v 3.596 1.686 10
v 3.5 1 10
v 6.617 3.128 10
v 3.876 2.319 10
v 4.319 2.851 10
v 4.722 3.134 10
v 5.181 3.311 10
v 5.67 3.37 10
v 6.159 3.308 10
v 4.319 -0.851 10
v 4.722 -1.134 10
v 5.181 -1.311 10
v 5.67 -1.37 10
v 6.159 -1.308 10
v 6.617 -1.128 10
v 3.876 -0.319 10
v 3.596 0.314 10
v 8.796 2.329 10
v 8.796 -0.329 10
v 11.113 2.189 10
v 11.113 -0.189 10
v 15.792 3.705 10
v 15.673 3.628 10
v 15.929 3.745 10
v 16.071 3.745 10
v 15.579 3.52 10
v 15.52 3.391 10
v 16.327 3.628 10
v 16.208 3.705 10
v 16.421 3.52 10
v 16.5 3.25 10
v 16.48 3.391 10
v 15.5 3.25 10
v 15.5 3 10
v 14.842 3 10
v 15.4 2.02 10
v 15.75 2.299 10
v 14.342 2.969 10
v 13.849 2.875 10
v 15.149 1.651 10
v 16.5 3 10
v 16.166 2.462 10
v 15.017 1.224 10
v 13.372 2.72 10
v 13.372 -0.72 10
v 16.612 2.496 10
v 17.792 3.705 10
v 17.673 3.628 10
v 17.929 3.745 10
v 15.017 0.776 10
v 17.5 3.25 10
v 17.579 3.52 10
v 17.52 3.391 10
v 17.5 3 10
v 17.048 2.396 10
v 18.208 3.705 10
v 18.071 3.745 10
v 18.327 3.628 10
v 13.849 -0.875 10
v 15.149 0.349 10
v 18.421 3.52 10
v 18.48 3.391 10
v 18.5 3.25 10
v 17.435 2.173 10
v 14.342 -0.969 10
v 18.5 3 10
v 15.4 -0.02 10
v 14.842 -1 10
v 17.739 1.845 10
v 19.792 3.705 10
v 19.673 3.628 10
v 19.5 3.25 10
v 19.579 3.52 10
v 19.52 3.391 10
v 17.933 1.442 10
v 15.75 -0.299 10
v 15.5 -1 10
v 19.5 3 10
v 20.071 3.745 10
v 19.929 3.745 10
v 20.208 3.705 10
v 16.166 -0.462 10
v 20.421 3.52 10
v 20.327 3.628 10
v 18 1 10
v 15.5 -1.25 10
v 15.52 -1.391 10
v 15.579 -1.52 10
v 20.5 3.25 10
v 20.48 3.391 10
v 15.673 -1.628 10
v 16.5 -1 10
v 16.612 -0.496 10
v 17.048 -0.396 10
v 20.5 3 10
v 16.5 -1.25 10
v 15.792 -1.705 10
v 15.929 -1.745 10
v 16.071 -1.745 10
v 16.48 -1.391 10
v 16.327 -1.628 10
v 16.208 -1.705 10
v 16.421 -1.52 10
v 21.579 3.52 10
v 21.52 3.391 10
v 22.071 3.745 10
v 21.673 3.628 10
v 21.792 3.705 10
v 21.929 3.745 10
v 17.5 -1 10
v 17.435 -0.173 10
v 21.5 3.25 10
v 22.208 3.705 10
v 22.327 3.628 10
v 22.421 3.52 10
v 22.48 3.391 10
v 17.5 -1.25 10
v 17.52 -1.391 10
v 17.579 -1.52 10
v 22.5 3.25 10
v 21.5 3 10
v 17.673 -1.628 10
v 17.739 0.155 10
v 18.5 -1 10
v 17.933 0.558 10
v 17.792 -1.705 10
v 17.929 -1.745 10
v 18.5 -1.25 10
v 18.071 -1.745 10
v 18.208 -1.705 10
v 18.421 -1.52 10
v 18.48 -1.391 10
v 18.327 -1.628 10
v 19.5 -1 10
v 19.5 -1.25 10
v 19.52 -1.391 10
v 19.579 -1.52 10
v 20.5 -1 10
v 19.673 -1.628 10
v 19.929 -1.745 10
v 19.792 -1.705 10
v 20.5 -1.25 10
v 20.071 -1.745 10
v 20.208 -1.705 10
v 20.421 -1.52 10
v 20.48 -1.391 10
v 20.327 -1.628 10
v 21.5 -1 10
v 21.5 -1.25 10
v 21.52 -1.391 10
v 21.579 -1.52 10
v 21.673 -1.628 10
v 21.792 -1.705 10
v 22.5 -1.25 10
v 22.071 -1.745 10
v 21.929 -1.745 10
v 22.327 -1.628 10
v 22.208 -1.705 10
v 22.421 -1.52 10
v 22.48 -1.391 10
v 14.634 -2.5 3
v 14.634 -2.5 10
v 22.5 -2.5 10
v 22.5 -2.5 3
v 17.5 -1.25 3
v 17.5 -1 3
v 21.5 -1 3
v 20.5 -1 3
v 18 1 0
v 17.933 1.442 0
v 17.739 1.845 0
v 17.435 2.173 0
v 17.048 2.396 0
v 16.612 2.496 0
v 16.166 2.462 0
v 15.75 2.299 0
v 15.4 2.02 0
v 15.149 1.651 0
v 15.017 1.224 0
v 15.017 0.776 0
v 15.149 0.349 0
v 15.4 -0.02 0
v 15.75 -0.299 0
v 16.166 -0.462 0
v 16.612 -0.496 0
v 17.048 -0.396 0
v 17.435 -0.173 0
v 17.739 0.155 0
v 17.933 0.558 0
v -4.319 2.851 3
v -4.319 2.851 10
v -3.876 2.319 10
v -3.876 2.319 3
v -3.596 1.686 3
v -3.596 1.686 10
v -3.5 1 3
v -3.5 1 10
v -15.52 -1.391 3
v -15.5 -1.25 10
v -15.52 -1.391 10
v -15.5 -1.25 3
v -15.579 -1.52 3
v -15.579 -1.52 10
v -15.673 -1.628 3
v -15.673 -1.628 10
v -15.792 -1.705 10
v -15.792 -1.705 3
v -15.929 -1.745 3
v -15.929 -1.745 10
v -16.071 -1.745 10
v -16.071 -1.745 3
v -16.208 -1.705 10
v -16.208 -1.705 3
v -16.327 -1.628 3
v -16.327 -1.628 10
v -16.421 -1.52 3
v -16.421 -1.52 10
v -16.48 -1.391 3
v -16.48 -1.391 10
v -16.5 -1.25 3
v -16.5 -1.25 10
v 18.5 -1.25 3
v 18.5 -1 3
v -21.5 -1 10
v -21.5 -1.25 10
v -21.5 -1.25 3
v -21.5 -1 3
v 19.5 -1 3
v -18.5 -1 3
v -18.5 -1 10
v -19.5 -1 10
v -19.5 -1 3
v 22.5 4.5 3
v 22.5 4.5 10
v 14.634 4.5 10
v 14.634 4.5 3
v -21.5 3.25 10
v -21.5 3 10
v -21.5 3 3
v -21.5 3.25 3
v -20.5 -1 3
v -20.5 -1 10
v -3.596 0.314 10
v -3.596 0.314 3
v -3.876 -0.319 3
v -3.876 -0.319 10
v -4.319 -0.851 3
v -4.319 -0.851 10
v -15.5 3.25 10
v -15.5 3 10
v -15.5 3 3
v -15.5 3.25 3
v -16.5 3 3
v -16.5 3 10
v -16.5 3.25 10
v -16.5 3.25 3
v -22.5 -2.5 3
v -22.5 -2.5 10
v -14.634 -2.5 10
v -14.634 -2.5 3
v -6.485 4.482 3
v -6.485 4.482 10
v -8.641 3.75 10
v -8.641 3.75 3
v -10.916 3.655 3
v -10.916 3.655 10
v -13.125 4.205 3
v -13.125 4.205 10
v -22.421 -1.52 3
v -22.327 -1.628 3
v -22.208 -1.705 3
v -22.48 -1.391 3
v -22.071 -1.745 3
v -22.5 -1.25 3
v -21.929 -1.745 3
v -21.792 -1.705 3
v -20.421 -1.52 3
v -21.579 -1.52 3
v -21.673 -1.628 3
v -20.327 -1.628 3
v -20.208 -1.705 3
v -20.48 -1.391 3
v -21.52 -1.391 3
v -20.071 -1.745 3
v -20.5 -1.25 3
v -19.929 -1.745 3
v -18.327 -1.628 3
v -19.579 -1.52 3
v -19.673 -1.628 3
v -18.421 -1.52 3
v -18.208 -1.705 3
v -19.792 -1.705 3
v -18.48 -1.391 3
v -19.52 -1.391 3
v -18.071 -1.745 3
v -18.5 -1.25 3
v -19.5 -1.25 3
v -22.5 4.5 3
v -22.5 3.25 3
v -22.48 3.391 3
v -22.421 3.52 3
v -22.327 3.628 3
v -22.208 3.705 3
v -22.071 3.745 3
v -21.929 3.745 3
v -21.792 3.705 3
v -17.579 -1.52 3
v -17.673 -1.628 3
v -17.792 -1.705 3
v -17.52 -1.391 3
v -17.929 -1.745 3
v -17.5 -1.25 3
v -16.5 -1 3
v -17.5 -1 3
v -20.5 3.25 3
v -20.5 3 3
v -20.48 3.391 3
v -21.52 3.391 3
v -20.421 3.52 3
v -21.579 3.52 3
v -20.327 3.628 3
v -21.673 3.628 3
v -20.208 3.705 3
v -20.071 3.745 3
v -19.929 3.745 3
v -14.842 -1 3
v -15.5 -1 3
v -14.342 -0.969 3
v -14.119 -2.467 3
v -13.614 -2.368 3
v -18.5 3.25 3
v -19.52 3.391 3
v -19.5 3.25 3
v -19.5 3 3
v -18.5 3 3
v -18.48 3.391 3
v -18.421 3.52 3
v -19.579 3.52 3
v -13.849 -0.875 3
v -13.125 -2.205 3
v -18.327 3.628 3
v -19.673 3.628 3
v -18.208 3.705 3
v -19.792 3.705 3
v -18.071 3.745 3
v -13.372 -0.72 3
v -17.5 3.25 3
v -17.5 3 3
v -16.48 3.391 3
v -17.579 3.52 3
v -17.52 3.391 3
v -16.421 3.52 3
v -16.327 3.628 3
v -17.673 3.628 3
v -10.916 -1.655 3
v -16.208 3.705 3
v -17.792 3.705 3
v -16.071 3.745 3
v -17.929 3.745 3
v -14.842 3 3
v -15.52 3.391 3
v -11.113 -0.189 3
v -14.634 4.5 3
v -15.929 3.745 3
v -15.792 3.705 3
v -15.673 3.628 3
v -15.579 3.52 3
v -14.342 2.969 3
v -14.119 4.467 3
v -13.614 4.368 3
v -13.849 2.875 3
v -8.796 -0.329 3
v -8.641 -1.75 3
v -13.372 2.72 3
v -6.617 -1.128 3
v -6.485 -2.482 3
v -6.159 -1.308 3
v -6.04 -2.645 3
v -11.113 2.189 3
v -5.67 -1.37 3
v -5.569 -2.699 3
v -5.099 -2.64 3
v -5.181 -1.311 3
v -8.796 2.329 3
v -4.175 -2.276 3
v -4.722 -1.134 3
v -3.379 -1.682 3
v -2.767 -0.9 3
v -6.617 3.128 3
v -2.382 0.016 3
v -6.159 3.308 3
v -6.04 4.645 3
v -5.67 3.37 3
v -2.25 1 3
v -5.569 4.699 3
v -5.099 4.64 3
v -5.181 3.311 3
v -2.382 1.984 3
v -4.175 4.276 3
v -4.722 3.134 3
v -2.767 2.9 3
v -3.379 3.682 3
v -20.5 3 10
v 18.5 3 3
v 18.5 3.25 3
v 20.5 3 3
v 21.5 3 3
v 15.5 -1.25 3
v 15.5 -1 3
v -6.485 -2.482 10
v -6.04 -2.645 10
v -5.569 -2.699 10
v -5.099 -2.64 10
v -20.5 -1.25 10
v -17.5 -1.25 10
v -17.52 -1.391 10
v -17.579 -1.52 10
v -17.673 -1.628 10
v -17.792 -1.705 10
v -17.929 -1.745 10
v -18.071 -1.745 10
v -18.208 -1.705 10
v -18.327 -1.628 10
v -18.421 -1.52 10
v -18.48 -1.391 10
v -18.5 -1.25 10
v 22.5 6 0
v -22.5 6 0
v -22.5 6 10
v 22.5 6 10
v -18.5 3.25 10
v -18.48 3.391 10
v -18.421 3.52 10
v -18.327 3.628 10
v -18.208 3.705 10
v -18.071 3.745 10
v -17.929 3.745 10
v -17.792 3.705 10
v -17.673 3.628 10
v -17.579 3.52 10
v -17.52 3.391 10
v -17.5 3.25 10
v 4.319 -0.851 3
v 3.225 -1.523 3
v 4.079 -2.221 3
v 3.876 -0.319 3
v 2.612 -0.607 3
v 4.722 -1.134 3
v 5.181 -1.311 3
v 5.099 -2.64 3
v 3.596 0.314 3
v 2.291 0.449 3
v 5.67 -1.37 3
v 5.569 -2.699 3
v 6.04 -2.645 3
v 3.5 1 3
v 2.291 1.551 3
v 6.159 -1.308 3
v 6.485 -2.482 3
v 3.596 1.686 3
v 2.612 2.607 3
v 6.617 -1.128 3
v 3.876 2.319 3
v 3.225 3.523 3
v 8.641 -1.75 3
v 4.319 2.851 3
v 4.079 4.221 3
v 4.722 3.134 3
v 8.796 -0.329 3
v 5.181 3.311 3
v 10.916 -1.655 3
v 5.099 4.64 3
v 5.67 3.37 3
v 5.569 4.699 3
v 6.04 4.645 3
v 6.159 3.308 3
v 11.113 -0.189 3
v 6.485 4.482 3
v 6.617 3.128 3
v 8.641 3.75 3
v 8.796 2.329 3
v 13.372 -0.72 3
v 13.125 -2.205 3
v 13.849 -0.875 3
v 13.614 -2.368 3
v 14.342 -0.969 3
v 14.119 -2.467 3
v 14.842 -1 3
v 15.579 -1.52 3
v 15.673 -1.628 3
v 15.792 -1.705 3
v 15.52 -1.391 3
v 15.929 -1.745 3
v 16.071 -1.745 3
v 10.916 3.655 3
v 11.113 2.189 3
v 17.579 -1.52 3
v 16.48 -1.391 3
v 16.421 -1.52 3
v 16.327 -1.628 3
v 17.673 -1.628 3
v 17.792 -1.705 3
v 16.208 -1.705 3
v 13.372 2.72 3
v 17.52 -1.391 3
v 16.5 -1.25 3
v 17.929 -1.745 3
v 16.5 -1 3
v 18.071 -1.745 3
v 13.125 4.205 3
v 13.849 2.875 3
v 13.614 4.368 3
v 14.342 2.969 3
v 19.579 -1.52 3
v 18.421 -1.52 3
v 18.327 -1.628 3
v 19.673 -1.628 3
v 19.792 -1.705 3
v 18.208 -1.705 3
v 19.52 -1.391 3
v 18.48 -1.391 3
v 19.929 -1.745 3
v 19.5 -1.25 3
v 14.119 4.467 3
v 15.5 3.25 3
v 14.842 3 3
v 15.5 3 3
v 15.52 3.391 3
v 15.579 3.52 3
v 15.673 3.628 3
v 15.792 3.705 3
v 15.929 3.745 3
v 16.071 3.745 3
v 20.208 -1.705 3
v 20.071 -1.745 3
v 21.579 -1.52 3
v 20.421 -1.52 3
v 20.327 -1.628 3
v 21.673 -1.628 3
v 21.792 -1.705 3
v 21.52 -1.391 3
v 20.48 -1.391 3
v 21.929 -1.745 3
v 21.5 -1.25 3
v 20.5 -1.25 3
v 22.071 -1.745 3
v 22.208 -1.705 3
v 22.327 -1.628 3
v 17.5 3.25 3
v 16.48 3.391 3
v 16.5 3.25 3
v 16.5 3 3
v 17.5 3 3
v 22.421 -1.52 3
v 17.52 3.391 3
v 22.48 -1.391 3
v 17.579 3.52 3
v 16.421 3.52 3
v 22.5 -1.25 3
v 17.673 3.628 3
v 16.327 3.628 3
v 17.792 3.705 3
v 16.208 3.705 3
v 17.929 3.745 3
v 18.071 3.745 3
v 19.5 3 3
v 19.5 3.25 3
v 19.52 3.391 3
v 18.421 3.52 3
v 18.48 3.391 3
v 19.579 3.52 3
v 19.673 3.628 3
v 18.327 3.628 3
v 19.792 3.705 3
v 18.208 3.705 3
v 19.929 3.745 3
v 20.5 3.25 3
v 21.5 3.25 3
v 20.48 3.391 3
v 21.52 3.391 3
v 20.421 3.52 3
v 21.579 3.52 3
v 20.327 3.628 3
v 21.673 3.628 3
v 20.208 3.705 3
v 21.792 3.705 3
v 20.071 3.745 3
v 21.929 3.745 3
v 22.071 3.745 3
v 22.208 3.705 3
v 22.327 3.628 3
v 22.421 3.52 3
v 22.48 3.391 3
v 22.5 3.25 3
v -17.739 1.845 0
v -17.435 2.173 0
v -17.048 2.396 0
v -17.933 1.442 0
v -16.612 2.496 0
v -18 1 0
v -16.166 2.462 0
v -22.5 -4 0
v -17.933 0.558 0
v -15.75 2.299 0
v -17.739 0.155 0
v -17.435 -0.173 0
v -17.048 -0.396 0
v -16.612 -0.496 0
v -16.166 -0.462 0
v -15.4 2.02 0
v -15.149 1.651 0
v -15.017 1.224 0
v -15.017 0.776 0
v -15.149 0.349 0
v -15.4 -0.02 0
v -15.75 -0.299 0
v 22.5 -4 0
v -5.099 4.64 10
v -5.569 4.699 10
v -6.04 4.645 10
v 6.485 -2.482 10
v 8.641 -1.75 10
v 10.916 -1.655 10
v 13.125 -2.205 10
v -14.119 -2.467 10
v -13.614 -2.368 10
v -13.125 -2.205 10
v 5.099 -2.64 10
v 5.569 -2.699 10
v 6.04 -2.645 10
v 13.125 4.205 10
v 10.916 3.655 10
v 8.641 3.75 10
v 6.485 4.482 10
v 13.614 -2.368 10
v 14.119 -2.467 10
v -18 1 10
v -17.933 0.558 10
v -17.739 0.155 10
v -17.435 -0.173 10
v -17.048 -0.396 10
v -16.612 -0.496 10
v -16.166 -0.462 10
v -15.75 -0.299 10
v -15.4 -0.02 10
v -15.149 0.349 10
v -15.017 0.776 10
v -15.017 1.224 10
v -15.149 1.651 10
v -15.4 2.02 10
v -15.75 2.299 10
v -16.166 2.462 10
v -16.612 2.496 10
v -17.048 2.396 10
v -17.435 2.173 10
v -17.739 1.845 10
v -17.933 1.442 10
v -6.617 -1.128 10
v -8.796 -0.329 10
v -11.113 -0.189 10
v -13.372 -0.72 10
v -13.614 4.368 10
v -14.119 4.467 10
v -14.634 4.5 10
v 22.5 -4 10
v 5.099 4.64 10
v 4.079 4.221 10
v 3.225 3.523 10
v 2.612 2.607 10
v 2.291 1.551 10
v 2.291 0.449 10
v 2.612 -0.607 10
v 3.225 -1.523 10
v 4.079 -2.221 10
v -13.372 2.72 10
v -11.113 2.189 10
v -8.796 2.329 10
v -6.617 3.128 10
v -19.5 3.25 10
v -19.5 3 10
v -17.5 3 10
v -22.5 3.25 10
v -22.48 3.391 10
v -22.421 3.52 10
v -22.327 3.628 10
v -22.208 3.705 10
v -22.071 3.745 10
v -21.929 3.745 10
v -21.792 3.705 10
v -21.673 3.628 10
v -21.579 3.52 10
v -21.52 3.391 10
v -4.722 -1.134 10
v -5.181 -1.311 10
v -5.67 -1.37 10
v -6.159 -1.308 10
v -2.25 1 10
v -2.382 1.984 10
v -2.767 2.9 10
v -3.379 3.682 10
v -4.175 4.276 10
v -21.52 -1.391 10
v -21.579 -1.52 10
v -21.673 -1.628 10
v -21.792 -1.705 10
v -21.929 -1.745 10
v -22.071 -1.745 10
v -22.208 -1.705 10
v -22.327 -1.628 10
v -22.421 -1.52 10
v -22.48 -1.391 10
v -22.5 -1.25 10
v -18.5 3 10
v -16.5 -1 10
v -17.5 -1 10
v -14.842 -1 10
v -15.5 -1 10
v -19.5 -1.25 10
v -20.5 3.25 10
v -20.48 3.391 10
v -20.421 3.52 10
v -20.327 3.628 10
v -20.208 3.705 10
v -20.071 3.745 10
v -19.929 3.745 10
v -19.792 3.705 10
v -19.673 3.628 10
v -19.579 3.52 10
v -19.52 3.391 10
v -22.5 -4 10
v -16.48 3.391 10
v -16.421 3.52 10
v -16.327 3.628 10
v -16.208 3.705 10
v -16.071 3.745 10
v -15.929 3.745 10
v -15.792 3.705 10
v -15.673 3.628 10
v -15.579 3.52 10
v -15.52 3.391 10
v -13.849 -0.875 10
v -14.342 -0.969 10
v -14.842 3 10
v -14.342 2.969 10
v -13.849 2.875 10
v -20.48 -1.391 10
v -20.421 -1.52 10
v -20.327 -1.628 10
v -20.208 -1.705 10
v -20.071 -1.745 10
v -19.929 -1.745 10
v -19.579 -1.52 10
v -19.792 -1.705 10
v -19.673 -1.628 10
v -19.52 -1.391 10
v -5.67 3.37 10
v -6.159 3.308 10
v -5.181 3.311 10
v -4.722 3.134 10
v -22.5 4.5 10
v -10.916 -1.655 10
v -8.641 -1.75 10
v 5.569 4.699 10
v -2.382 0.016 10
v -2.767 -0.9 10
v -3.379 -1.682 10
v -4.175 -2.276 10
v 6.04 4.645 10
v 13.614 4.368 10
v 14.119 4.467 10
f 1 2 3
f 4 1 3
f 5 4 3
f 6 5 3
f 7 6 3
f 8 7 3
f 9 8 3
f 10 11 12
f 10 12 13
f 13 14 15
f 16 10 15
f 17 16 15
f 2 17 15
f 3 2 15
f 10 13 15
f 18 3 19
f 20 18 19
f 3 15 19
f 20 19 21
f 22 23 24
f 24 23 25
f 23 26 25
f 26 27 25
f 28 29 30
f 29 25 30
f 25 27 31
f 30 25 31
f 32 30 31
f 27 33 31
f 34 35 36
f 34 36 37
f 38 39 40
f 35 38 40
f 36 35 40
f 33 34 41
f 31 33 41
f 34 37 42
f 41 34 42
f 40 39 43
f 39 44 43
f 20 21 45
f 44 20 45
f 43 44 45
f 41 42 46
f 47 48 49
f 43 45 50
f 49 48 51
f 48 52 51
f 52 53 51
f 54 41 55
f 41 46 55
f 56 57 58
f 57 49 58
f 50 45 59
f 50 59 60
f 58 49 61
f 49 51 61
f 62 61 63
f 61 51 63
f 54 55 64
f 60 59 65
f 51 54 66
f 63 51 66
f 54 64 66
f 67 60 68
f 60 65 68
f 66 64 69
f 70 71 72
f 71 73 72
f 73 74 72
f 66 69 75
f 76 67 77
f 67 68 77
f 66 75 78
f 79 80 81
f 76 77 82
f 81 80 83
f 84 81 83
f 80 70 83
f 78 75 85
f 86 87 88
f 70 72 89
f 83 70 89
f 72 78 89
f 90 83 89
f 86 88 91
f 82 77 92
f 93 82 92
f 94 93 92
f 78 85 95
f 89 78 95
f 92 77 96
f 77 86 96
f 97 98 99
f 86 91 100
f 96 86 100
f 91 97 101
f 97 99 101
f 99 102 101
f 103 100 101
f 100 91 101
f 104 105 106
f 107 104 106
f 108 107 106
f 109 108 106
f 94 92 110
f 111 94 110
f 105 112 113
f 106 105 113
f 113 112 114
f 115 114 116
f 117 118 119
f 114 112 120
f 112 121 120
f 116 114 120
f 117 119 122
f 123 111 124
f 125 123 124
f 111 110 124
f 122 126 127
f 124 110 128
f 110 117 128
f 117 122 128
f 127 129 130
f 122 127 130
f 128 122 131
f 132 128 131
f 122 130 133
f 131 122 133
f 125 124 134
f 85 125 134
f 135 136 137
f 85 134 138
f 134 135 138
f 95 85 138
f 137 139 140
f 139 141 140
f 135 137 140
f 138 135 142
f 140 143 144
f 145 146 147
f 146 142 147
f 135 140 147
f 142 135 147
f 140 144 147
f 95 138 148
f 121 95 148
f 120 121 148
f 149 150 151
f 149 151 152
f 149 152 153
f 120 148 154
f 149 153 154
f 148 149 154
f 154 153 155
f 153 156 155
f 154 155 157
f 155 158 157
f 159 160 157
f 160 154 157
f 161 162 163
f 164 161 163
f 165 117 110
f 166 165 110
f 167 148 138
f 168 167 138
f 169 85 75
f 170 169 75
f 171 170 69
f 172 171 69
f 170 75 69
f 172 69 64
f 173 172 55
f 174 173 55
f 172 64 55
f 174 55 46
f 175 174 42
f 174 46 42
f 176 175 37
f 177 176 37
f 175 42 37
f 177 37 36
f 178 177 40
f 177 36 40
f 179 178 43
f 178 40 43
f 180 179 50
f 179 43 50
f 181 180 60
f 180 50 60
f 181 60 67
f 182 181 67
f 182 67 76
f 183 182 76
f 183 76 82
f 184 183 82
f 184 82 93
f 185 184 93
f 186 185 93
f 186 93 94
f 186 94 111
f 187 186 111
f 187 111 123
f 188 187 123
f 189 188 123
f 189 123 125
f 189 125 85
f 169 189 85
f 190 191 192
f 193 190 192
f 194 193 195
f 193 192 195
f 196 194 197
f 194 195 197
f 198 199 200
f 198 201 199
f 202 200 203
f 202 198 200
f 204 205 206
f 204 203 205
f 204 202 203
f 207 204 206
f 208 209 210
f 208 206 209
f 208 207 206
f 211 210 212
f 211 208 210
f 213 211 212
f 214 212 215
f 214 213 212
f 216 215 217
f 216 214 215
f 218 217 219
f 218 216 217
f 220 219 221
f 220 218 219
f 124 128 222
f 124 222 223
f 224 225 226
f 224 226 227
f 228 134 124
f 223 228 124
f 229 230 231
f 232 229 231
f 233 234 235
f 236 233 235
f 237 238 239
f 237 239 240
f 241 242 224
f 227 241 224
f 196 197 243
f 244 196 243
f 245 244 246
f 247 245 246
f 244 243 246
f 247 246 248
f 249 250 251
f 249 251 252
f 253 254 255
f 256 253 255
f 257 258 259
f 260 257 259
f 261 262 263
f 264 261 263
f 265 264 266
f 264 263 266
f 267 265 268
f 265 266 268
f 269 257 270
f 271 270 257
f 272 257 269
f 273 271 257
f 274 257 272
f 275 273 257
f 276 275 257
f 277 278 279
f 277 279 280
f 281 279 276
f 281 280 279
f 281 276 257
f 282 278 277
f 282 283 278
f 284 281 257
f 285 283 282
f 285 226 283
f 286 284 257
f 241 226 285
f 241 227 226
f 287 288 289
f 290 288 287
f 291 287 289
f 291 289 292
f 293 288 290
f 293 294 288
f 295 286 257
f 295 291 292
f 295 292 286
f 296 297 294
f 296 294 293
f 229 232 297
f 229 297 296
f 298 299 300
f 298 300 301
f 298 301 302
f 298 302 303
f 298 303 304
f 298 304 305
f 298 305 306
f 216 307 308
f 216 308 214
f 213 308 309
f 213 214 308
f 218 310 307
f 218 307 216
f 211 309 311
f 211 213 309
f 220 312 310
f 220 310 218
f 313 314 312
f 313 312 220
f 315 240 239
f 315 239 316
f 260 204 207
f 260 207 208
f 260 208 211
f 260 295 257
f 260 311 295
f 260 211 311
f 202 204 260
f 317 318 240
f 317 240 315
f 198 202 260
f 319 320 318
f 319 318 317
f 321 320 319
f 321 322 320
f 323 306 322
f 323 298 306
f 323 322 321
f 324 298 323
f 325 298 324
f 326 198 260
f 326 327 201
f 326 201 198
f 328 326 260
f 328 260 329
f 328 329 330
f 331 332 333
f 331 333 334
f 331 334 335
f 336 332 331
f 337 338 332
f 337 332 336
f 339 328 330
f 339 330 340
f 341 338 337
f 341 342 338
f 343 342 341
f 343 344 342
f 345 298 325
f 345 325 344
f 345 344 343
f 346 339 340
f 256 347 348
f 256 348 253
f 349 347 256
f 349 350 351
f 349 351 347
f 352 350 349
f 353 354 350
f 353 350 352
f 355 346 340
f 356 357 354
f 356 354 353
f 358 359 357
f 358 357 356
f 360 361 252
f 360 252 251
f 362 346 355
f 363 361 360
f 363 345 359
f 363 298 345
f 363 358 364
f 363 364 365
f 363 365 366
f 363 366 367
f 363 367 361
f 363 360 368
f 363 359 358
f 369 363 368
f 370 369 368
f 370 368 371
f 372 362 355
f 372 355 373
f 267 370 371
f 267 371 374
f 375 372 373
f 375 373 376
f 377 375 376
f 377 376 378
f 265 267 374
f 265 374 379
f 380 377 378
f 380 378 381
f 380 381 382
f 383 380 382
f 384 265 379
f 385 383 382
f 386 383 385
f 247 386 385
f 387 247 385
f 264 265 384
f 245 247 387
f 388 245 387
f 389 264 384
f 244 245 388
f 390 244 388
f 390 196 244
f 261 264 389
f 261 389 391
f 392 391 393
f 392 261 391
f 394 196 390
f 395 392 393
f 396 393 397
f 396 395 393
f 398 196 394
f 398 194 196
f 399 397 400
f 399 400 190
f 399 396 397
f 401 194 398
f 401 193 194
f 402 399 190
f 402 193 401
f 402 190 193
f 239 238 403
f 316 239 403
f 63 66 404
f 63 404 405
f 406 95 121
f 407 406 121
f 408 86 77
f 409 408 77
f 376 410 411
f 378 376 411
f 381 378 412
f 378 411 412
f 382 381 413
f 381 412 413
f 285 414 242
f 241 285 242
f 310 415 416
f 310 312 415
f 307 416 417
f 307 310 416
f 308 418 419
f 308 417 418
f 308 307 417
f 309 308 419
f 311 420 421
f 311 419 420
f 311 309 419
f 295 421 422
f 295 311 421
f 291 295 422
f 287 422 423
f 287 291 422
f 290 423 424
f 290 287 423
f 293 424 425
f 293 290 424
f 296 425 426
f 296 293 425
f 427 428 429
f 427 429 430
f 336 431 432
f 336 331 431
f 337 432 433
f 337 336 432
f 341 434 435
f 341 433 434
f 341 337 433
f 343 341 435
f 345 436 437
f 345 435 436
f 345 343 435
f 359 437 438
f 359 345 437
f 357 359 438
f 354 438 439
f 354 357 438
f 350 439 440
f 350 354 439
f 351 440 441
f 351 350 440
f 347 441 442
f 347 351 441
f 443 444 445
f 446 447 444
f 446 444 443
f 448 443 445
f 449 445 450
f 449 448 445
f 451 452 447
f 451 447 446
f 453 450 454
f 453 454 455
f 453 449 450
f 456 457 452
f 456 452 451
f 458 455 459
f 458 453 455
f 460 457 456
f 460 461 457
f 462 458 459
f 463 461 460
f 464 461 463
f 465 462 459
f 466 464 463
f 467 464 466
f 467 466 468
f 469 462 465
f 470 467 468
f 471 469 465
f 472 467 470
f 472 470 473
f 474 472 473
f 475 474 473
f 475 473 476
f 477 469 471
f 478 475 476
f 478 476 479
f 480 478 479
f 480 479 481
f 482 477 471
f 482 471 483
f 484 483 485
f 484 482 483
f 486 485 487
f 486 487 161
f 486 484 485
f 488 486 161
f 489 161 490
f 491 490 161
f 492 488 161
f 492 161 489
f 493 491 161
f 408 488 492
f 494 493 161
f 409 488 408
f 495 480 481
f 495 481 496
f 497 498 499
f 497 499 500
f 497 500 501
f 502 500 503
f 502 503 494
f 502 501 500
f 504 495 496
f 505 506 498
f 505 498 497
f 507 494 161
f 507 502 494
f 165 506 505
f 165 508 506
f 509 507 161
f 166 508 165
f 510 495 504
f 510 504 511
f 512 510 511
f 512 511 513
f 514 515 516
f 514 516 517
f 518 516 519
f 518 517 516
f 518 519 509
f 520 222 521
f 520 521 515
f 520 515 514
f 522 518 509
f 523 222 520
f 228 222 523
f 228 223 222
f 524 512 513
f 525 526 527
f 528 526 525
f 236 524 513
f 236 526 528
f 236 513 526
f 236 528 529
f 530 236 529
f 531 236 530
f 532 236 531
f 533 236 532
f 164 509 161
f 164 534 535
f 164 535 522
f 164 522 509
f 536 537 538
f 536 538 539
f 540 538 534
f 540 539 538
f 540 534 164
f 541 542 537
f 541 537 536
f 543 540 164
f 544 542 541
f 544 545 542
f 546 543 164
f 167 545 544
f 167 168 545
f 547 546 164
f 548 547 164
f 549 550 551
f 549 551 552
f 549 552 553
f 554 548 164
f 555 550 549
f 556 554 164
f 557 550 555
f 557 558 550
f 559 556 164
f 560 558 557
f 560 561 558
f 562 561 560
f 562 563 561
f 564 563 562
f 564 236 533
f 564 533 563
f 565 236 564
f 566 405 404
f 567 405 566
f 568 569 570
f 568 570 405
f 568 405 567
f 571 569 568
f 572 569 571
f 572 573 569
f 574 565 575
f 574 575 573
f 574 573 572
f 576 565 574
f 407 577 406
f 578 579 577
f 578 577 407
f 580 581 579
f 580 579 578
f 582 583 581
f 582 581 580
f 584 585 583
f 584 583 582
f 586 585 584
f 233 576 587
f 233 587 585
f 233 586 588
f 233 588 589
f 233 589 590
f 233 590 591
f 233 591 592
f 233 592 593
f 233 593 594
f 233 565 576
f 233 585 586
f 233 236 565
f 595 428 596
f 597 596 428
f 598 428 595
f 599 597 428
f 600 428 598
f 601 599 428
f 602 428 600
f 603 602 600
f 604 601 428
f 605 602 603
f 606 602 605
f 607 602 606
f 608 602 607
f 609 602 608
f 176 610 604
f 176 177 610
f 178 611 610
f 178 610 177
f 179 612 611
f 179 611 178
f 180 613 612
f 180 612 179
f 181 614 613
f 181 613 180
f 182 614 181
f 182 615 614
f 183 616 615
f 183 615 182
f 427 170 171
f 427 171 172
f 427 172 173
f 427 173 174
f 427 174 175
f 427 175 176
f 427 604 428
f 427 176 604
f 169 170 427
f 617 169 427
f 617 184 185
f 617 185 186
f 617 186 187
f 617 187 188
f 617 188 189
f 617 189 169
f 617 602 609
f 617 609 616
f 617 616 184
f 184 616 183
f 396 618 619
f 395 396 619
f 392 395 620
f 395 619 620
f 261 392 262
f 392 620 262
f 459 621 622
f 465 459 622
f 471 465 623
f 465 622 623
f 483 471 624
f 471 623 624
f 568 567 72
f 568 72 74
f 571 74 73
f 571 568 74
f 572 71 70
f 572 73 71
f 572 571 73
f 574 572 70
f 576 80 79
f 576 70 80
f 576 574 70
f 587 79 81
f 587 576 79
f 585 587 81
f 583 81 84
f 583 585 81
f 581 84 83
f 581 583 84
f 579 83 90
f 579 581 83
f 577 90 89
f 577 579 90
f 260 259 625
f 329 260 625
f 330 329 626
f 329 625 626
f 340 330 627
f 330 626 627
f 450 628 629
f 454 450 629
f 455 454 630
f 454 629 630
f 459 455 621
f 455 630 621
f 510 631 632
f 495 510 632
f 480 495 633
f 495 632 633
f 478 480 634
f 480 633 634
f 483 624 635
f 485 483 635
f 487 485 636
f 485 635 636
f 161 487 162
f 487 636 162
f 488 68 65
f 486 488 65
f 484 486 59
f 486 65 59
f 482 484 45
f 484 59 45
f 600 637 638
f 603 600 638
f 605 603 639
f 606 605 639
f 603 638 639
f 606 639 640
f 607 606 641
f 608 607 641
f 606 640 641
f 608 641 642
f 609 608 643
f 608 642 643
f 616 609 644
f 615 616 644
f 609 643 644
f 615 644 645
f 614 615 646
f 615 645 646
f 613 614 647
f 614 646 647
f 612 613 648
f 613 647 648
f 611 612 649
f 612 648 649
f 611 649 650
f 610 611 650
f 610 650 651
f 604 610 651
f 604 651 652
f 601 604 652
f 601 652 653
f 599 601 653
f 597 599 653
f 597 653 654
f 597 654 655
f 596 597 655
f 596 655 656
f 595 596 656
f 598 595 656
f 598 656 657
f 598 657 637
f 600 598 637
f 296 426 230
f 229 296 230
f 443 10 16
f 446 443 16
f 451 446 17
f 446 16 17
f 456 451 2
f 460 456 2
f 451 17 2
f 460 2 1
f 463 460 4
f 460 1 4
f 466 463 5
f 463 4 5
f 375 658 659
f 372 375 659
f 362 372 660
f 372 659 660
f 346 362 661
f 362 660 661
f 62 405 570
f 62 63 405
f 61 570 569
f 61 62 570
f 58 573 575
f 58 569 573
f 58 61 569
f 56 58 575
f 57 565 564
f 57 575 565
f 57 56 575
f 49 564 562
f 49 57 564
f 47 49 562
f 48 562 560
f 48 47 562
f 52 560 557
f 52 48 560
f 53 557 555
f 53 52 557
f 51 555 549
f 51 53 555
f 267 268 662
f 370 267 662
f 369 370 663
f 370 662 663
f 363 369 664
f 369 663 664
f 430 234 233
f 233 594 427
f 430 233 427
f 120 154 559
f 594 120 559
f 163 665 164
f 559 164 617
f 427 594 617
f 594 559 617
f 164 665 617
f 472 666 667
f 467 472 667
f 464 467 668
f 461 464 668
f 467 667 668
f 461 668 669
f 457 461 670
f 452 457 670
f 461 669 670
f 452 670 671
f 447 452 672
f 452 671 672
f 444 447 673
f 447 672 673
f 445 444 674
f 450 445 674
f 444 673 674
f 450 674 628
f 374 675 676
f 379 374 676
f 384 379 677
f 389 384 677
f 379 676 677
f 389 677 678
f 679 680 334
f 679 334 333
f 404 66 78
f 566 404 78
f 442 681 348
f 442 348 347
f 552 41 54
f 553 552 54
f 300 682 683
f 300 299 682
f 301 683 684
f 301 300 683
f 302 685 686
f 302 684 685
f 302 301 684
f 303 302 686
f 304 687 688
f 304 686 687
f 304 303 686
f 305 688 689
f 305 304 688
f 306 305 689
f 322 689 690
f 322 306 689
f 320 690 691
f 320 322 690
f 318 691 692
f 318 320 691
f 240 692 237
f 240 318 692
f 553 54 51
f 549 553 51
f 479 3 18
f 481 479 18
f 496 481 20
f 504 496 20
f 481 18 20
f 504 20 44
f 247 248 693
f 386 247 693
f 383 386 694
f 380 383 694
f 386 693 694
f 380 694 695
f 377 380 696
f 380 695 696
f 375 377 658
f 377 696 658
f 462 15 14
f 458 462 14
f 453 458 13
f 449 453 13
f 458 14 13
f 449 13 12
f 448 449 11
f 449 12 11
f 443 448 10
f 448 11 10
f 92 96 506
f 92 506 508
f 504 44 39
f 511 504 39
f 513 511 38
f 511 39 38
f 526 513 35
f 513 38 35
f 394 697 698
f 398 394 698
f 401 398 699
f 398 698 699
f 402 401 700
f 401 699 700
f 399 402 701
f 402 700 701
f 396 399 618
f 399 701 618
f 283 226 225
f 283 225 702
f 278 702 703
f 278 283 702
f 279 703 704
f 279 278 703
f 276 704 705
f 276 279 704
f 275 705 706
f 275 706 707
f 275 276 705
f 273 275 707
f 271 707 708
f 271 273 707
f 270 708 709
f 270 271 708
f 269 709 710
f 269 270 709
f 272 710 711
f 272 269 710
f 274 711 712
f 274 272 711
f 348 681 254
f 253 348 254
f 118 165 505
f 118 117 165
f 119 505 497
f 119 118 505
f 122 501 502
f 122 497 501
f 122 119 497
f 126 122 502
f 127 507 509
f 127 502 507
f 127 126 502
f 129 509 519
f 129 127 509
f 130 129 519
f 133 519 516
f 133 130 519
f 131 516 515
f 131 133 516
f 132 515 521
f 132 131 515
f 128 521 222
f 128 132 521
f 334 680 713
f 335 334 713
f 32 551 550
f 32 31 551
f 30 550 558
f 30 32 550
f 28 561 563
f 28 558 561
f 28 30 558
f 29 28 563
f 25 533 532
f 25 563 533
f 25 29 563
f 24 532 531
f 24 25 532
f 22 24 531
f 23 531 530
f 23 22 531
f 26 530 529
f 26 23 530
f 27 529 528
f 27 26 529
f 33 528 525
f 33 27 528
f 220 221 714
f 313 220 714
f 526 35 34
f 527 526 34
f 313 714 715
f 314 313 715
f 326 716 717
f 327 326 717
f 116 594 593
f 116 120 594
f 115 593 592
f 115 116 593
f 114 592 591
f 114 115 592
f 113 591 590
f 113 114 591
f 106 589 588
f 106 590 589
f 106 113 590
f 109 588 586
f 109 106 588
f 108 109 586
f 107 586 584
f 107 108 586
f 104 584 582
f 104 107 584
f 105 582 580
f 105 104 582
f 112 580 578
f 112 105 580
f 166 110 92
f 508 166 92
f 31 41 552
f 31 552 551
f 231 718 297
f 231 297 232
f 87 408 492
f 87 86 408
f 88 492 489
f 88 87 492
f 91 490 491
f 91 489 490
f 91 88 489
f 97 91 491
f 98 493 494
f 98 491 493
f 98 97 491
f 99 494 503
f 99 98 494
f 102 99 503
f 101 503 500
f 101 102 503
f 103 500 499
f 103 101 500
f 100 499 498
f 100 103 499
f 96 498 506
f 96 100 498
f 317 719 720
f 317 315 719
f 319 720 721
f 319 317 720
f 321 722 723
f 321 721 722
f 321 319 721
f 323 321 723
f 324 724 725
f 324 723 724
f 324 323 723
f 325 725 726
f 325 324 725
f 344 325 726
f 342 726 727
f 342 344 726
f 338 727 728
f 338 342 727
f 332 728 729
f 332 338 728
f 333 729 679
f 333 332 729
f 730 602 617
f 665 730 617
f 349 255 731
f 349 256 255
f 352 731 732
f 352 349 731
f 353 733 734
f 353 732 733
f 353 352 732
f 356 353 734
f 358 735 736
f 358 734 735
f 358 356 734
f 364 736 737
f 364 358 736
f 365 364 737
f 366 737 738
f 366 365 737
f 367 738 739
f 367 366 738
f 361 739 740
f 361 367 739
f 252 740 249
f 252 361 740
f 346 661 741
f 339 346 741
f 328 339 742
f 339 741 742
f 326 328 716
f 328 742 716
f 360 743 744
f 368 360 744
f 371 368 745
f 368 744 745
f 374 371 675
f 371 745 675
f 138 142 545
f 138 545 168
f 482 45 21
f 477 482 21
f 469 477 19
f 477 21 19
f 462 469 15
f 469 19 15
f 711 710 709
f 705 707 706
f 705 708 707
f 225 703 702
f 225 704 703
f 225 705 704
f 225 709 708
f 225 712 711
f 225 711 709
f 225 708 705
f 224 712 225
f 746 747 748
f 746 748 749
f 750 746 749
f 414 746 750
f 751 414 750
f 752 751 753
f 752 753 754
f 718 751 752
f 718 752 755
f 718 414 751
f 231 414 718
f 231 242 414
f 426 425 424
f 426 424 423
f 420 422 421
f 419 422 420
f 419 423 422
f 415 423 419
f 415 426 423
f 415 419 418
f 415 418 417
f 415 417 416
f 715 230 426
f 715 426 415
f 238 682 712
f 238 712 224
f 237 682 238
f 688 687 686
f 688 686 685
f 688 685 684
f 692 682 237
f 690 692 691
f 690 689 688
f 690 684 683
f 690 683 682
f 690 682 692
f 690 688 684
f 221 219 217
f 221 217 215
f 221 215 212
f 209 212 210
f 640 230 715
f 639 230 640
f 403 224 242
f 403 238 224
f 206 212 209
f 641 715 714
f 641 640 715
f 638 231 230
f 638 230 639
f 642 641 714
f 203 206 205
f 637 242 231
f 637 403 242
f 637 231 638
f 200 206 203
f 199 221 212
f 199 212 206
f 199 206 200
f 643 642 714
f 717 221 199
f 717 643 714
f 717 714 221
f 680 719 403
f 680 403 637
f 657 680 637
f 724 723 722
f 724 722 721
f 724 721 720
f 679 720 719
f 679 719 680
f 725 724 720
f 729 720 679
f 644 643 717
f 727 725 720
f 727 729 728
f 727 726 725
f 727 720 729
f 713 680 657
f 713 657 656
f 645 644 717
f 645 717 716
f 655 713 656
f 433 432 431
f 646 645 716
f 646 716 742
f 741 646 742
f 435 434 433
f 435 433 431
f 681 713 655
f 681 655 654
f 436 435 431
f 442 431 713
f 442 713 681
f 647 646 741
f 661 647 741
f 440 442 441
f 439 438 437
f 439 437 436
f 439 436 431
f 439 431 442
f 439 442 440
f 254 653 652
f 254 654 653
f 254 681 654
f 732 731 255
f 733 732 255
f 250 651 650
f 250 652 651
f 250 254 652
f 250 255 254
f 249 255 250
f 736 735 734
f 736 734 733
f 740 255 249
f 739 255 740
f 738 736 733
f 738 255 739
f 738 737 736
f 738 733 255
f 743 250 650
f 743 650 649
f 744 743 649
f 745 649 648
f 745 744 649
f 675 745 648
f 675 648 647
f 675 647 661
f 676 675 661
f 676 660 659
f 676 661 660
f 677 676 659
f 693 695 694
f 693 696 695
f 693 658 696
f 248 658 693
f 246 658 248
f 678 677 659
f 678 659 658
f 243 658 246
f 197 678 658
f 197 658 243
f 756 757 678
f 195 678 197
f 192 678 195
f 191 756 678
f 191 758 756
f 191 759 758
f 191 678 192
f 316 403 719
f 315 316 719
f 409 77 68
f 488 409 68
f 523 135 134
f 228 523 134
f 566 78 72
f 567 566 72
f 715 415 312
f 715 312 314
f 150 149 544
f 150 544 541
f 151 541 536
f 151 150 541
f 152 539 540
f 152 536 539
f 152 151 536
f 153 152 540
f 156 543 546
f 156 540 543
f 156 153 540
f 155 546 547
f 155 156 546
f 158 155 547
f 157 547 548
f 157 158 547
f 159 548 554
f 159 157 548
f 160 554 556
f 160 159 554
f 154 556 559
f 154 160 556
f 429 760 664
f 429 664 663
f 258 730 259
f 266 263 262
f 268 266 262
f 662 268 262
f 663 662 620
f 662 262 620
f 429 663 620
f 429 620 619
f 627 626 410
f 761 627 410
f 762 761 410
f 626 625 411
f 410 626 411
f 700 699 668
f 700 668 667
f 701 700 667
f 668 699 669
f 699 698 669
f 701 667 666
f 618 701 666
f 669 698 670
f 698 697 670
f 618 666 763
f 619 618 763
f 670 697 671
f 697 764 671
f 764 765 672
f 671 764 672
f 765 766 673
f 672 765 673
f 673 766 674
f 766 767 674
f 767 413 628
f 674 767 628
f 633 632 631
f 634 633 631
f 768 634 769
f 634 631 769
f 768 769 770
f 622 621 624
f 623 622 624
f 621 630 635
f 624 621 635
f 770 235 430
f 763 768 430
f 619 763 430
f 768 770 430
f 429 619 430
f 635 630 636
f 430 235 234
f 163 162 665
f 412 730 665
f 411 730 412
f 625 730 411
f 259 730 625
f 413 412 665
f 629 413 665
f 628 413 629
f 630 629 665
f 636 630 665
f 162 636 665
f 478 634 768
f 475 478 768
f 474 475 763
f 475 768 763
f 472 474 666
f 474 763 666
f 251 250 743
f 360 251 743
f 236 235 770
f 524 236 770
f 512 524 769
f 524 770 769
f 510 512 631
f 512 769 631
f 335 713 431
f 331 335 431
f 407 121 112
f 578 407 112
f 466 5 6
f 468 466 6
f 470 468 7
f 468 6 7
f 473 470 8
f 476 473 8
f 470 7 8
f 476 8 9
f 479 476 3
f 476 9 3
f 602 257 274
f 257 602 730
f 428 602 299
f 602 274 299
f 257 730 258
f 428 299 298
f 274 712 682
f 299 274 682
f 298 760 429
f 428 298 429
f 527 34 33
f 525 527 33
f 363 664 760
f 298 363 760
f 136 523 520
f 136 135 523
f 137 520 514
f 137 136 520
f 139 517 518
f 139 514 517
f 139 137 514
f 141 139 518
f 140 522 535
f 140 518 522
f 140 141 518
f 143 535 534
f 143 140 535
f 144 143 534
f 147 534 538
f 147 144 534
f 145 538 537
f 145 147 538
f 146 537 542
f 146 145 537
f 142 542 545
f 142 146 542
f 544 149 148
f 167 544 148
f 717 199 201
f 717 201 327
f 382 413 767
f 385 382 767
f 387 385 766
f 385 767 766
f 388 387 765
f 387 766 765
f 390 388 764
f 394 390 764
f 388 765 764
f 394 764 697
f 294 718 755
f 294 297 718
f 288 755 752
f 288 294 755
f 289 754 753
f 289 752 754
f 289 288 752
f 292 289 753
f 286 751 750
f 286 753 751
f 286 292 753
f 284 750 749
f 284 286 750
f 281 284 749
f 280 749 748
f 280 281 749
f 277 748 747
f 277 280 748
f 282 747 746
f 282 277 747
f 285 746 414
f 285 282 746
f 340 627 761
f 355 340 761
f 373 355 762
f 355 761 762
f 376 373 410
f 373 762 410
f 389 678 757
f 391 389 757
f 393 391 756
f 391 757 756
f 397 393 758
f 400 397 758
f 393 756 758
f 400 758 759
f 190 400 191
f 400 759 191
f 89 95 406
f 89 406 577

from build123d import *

# Parameters (mm, degrees)
SKETCH_1_W          = 45
SKETCH_1_H          = 8
EXTRUDE_1_DEPTH     = 10
SKETCH_4_W          = 45
SKETCH_4_H          = 10
EXTRUDE_2_DEPTH     = 2
CUT_EXTRUDE_1_DEPTH = 7
SKETCH_7_W          = 1
SKETCH_7_H          = 0.75
EXTRUDE_3_DEPTH     = 7
FILLET_2_RADIUS     = 0.5
FILLET_2_LENGTH     = 7
FILLET_3_RADIUS     = 0.5
FILLET_3_LENGTH     = 7
FILLET_4_RADIUS     = 0.5
FILLET_4_LENGTH     = 7
FILLET_5_RADIUS     = 0.5
FILLET_5_LENGTH     = 7
FILLET_7_RADIUS     = 0.5
FILLET_7_LENGTH     = 7
FILLET_8_RADIUS     = 0.5
FILLET_8_LENGTH     = 7
FILLET_9_RADIUS     = 0.5
FILLET_9_LENGTH     = 7
FILLET_10_RADIUS    = 0.5
FILLET_10_LENGTH    = 7
FILLET_11_RADIUS    = 0.5
FILLET_11_LENGTH    = 7
FILLET_12_RADIUS    = 0.5
FILLET_12_LENGTH    = 7
FILLET_13_RADIUS    = 0.5
FILLET_13_LENGTH    = 7
FILLET_14_RADIUS    = 0.5
FILLET_14_LENGTH    = 7
FILLET_15_RADIUS    = 0.5
FILLET_15_LENGTH    = 7
FILLET_16_RADIUS    = 0.5
FILLET_16_LENGTH    = 7
FILLET_17_RADIUS    = 0.5
FILLET_17_LENGTH    = 7
FILLET_18_RADIUS    = 0.5
FILLET_18_LENGTH    = 7
SKETCH_8_R          = 1.5
CUT_EXTRUDE_3_DEPTH = 26.342651795


with BuildPart() as part:
    # Эскиз1 → Бобышка-Вытянуть1 (new body)
    with BuildSketch(Plane.XY):
        Rectangle(SKETCH_1_W, SKETCH_1_H)
    extrude(amount=EXTRUDE_1_DEPTH)

    # Эскиз4 → Бобышка-Вытянуть2 (add)
    with BuildSketch(Plane(origin=(0, 4, 0), x_dir=(1, 0, 0), z_dir=(0, 1, 0))):
        with Locations((0, -5)):
            Rectangle(SKETCH_4_W, SKETCH_4_H)
    extrude(amount=EXTRUDE_2_DEPTH)

    # Эскиз6 → Вырез-Вытянуть1 (cut)
    with BuildSketch(Plane.XY.offset(10)):
        with BuildLine():
            Line((-3.5, 1), (-2.25, 1))
            ThreePointArc((-2.25, 1), (-3.046951205, 3.311277313), (-5.099068169, 4.640167831))
            ThreePointArc((-5.099068169, 4.640167831), (-5.806494099, 4.685829095), (-6.485410015, 4.481844837))
            ThreePointArc((-6.485410015, 4.481844837), (-9.775223042, 3.62120142), (-13.125305151, 4.204748078))
            ThreePointArc((-13.125305151, 4.204748078), (-13.865120501, 4.42549311), (-14.63356298, 4.5))
            Line((-14.63356298, 4.5), (-22.5, 4.5))
            Line((-22.5, 4.5), (-22.5, 3.75))
            Line((-22.5, 3.75), (-22.5, 3))
            Line((-22.5, 3), (-17, 3))
            Line((-17, 3), (-14.842076238, 3))
            ThreePointArc((-14.842076238, 3), (-14.093837358, 2.929394174), (-13.372013489, 2.720069289))
            ThreePointArc((-13.372013489, 2.720069289), (-9.949457281, 2.174767327), (-6.617441597, 3.128138563))
            ThreePointArc((-6.617441597, 3.128138563), (-5.42405994, 3.3556968), (-4.31914999, 2.850606183))
            ThreePointArc((-4.31914999, 2.850606183), (-3.713941708, 2.011897963), (-3.5, 1))
        make_face()
        with BuildLine():
            ThreePointArc((-5.099068169, -2.640167831), (-3.046951205, -1.311277313), (-2.25, 1))
            Line((-2.25, 1), (-3.5, 1))
            ThreePointArc((-3.5, 1), (-3.713941708, -0.011897963), (-4.31914999, -0.850606183))
            ThreePointArc((-4.31914999, -0.850606183), (-5.42405994, -1.3556968), (-6.617441597, -1.128138563))
            ThreePointArc((-6.617441597, -1.128138563), (-9.949457281, -0.174767327), (-13.372013489, -0.720069289))
            ThreePointArc((-13.372013489, -0.720069289), (-14.093837358, -0.929394174), (-14.842076238, -1))
            Line((-14.842076238, -1), (-17, -1))
            Line((-17, -1), (-22.5, -1))
            Line((-22.5, -1), (-22.5, -2.5))
            Line((-22.5, -2.5), (-14.63356298, -2.5))
            ThreePointArc((-14.63356298, -2.5), (-13.865120501, -2.42549311), (-13.125305151, -2.204748078))
            ThreePointArc((-13.125305151, -2.204748078), (-9.775223042, -1.62120142), (-6.485410015, -2.481844837))
            ThreePointArc((-6.485410015, -2.481844837), (-5.806494099, -2.685829095), (-5.099068169, -2.640167831))
        make_face()
        with BuildLine():
            Line((14.63356298, -2.5), (22.5, -2.5))
            Line((22.5, -2.5), (22.5, -1))
            Line((22.5, -1), (17, -1))
            Line((17, -1), (14.842076238, -1))
            ThreePointArc((14.842076238, -1), (14.093837358, -0.929394174), (13.372013489, -0.720069289))
            ThreePointArc((13.372013489, -0.720069289), (9.949457281, -0.174767327), (6.617441597, -1.128138563))
            ThreePointArc((6.617441597, -1.128138563), (5.42405994, -1.3556968), (4.31914999, -0.850606183))
            ThreePointArc((4.31914999, -0.850606183), (3.5, 1), (4.31914999, 2.850606183))
            ThreePointArc((4.31914999, 2.850606183), (5.42405994, 3.3556968), (6.617441597, 3.128138563))
            ThreePointArc((6.617441597, 3.128138563), (9.949457281, 2.174767327), (13.372013489, 2.720069289))
            ThreePointArc((13.372013489, 2.720069289), (14.093837358, 2.929394174), (14.842076238, 3))
            Line((14.842076238, 3), (17, 3))
            Line((17, 3), (22.5, 3))
            Line((22.5, 3), (22.5, 3.75))
            Line((22.5, 3.75), (22.5, 4.5))
            Line((22.5, 4.5), (14.63356298, 4.5))
            ThreePointArc((14.63356298, 4.5), (13.865120501, 4.42549311), (13.125305151, 4.204748078))
            ThreePointArc((13.125305151, 4.204748078), (9.775223042, 3.62120142), (6.485410015, 4.481844837))
            ThreePointArc((6.485410015, 4.481844837), (5.806494099, 4.685829095), (5.099068169, 4.640167831))
            ThreePointArc((5.099068169, 4.640167831), (2.25, 1), (5.099068169, -2.640167831))
            ThreePointArc((5.099068169, -2.640167831), (5.806494099, -2.685829095), (6.485410015, -2.481844837))
            ThreePointArc((6.485410015, -2.481844837), (9.775223042, -1.62120142), (13.125305151, -2.204748078))
            ThreePointArc((13.125305151, -2.204748078), (13.865120501, -2.42549311), (14.63356298, -2.5))
        make_face()
    extrude(amount=-CUT_EXTRUDE_1_DEPTH, mode=Mode.SUBTRACT)

    # Эскиз7 → Бобышка-Вытянуть3 (add)
    with BuildSketch(Plane.XY.offset(10)):
        with Locations((-22, 3.375)):
            Rectangle(SKETCH_7_W, SKETCH_7_H)
        with Locations((-20, 3.375)):
            Rectangle(SKETCH_7_W, SKETCH_7_H)
        with Locations((-18, 3.375)):
            Rectangle(SKETCH_7_W, SKETCH_7_H)
        with Locations((-16, 3.375)):
            Rectangle(SKETCH_7_W, SKETCH_7_H)
        with Locations((-22, -1.375)):
            Rectangle(SKETCH_7_W, SKETCH_7_H)
        with Locations((-20, -1.375)):
            Rectangle(SKETCH_7_W, SKETCH_7_H)
        with Locations((-18, -1.375)):
            Rectangle(SKETCH_7_W, SKETCH_7_H)
        with Locations((-16, -1.375)):
            Rectangle(SKETCH_7_W, SKETCH_7_H)
        with Locations((16, 3.375)):
            Rectangle(SKETCH_7_W, SKETCH_7_H)
        with Locations((18, 3.375)):
            Rectangle(SKETCH_7_W, SKETCH_7_H)
        with Locations((22, 3.375)):
            Rectangle(SKETCH_7_W, SKETCH_7_H)
        with Locations((22, -1.375)):
            Rectangle(SKETCH_7_W, SKETCH_7_H)
        with Locations((20, -1.375)):
            Rectangle(SKETCH_7_W, SKETCH_7_H)
        with Locations((18, -1.375)):
            Rectangle(SKETCH_7_W, SKETCH_7_H)
        with Locations((16, -1.375)):
            Rectangle(SKETCH_7_W, SKETCH_7_H)
        with Locations((20, 3.375)):
            Rectangle(SKETCH_7_W, SKETCH_7_H)
    extrude(amount=-EXTRUDE_3_DEPTH)

    # Скругление2: full round fillet: the end face becomes a half cylinder, R = half its width
    fillet_2_face = Plane((-20, 3.75, 6.5), x_dir=(0, 0, -1), z_dir=(0, 1, 0))  # on the end face: x along it, z out of the body
    fillet_2_slab = fillet_2_face.offset(-FILLET_2_RADIUS / 2) * Box(FILLET_2_LENGTH, 2 * FILLET_2_RADIUS, FILLET_2_RADIUS, mode=Mode.PRIVATE)  # the body's end, R deep
    fillet_2_round = Plane((-20, 3.25, 6.5), x_dir=(0, 1, 0), z_dir=(0, 0, -1)) * Cylinder(FILLET_2_RADIUS, FILLET_2_LENGTH, mode=Mode.PRIVATE)  # its axis R under the face
    add(fillet_2_slab - fillet_2_round, mode=Mode.SUBTRACT)

    # Скругление3: full round fillet: the end face becomes a half cylinder, R = half its width
    fillet_3_face = Plane((-18, 3.75, 6.5), x_dir=(0, 0, -1), z_dir=(0, 1, 0))  # on the end face: x along it, z out of the body
    fillet_3_slab = fillet_3_face.offset(-FILLET_3_RADIUS / 2) * Box(FILLET_3_LENGTH, 2 * FILLET_3_RADIUS, FILLET_3_RADIUS, mode=Mode.PRIVATE)  # the body's end, R deep
    fillet_3_round = Plane((-18, 3.25, 6.5), x_dir=(0, 1, 0), z_dir=(0, 0, -1)) * Cylinder(FILLET_3_RADIUS, FILLET_3_LENGTH, mode=Mode.PRIVATE)  # its axis R under the face
    add(fillet_3_slab - fillet_3_round, mode=Mode.SUBTRACT)

    # Скругление4: full round fillet: the end face becomes a half cylinder, R = half its width
    fillet_4_face = Plane((-16, 3.75, 6.5), x_dir=(0, 0, -1), z_dir=(0, 1, 0))  # on the end face: x along it, z out of the body
    fillet_4_slab = fillet_4_face.offset(-FILLET_4_RADIUS / 2) * Box(FILLET_4_LENGTH, 2 * FILLET_4_RADIUS, FILLET_4_RADIUS, mode=Mode.PRIVATE)  # the body's end, R deep
    fillet_4_round = Plane((-16, 3.25, 6.5), x_dir=(0, 1, 0), z_dir=(0, 0, -1)) * Cylinder(FILLET_4_RADIUS, FILLET_4_LENGTH, mode=Mode.PRIVATE)  # its axis R under the face
    add(fillet_4_slab - fillet_4_round, mode=Mode.SUBTRACT)

    # Скругление5: full round fillet: the end face becomes a half cylinder, R = half its width
    fillet_5_face = Plane((-22, 3.75, 6.5), x_dir=(0, 0, -1), z_dir=(0, 1, 0))  # on the end face: x along it, z out of the body
    fillet_5_slab = fillet_5_face.offset(-FILLET_5_RADIUS / 2) * Box(FILLET_5_LENGTH, 2 * FILLET_5_RADIUS, FILLET_5_RADIUS, mode=Mode.PRIVATE)  # the body's end, R deep
    fillet_5_round = Plane((-22, 3.25, 6.5), x_dir=(0, 1, 0), z_dir=(0, 0, -1)) * Cylinder(FILLET_5_RADIUS, FILLET_5_LENGTH, mode=Mode.PRIVATE)  # its axis R under the face
    add(fillet_5_slab - fillet_5_round, mode=Mode.SUBTRACT)

    # Скругление7: full round fillet: the end face becomes a half cylinder, R = half its width
    fillet_7_face = Plane((-22, -1.75, 6.5), x_dir=(0, 0, -1), z_dir=(0, -1, 0))  # on the end face: x along it, z out of the body
    fillet_7_slab = fillet_7_face.offset(-FILLET_7_RADIUS / 2) * Box(FILLET_7_LENGTH, 2 * FILLET_7_RADIUS, FILLET_7_RADIUS, mode=Mode.PRIVATE)  # the body's end, R deep
    fillet_7_round = Plane((-22, -1.25, 6.5), x_dir=(0, -1, 0), z_dir=(0, 0, -1)) * Cylinder(FILLET_7_RADIUS, FILLET_7_LENGTH, mode=Mode.PRIVATE)  # its axis R under the face
    add(fillet_7_slab - fillet_7_round, mode=Mode.SUBTRACT)

    # Скругление8: full round fillet: the end face becomes a half cylinder, R = half its width
    fillet_8_face = Plane((-20, -1.75, 6.5), x_dir=(0, 0, -1), z_dir=(0, -1, 0))  # on the end face: x along it, z out of the body
    fillet_8_slab = fillet_8_face.offset(-FILLET_8_RADIUS / 2) * Box(FILLET_8_LENGTH, 2 * FILLET_8_RADIUS, FILLET_8_RADIUS, mode=Mode.PRIVATE)  # the body's end, R deep
    fillet_8_round = Plane((-20, -1.25, 6.5), x_dir=(0, -1, 0), z_dir=(0, 0, -1)) * Cylinder(FILLET_8_RADIUS, FILLET_8_LENGTH, mode=Mode.PRIVATE)  # its axis R under the face
    add(fillet_8_slab - fillet_8_round, mode=Mode.SUBTRACT)

    # Скругление9: full round fillet: the end face becomes a half cylinder, R = half its width
    fillet_9_face = Plane((-18, -1.75, 6.5), x_dir=(0, 0, -1), z_dir=(0, -1, 0))  # on the end face: x along it, z out of the body
    fillet_9_slab = fillet_9_face.offset(-FILLET_9_RADIUS / 2) * Box(FILLET_9_LENGTH, 2 * FILLET_9_RADIUS, FILLET_9_RADIUS, mode=Mode.PRIVATE)  # the body's end, R deep
    fillet_9_round = Plane((-18, -1.25, 6.5), x_dir=(0, -1, 0), z_dir=(0, 0, -1)) * Cylinder(FILLET_9_RADIUS, FILLET_9_LENGTH, mode=Mode.PRIVATE)  # its axis R under the face
    add(fillet_9_slab - fillet_9_round, mode=Mode.SUBTRACT)

    # Скругление10: full round fillet: the end face becomes a half cylinder, R = half its width
    fillet_10_face = Plane((-16, -1.75, 6.5), x_dir=(0, 0, -1), z_dir=(0, -1, 0))  # on the end face: x along it, z out of the body
    fillet_10_slab = fillet_10_face.offset(-FILLET_10_RADIUS / 2) * Box(FILLET_10_LENGTH, 2 * FILLET_10_RADIUS, FILLET_10_RADIUS, mode=Mode.PRIVATE)  # the body's end, R deep
    fillet_10_round = Plane((-16, -1.25, 6.5), x_dir=(0, -1, 0), z_dir=(0, 0, -1)) * Cylinder(FILLET_10_RADIUS, FILLET_10_LENGTH, mode=Mode.PRIVATE)  # its axis R under the face
    add(fillet_10_slab - fillet_10_round, mode=Mode.SUBTRACT)

    # Скругление11: full round fillet: the end face becomes a half cylinder, R = half its width
    fillet_11_face = Plane((22, -1.75, 6.5), x_dir=(0, 0, 1), z_dir=(0, -1, 0))  # on the end face: x along it, z out of the body
    fillet_11_slab = fillet_11_face.offset(-FILLET_11_RADIUS / 2) * Box(FILLET_11_LENGTH, 2 * FILLET_11_RADIUS, FILLET_11_RADIUS, mode=Mode.PRIVATE)  # the body's end, R deep
    fillet_11_round = Plane((22, -1.25, 6.5), x_dir=(0, -1, 0), z_dir=(0, 0, 1)) * Cylinder(FILLET_11_RADIUS, FILLET_11_LENGTH, mode=Mode.PRIVATE)  # its axis R under the face
    add(fillet_11_slab - fillet_11_round, mode=Mode.SUBTRACT)

    # Скругление12: full round fillet: the end face becomes a half cylinder, R = half its width
    fillet_12_face = Plane((20, -1.75, 6.5), x_dir=(0, 0, 1), z_dir=(0, -1, 0))  # on the end face: x along it, z out of the body
    fillet_12_slab = fillet_12_face.offset(-FILLET_12_RADIUS / 2) * Box(FILLET_12_LENGTH, 2 * FILLET_12_RADIUS, FILLET_12_RADIUS, mode=Mode.PRIVATE)  # the body's end, R deep
    fillet_12_round = Plane((20, -1.25, 6.5), x_dir=(0, -1, 0), z_dir=(0, 0, 1)) * Cylinder(FILLET_12_RADIUS, FILLET_12_LENGTH, mode=Mode.PRIVATE)  # its axis R under the face
    add(fillet_12_slab - fillet_12_round, mode=Mode.SUBTRACT)

    # Скругление13: full round fillet: the end face becomes a half cylinder, R = half its width
    fillet_13_face = Plane((18, -1.75, 6.5), x_dir=(0, 0, 1), z_dir=(0, -1, 0))  # on the end face: x along it, z out of the body
    fillet_13_slab = fillet_13_face.offset(-FILLET_13_RADIUS / 2) * Box(FILLET_13_LENGTH, 2 * FILLET_13_RADIUS, FILLET_13_RADIUS, mode=Mode.PRIVATE)  # the body's end, R deep
    fillet_13_round = Plane((18, -1.25, 6.5), x_dir=(0, -1, 0), z_dir=(0, 0, 1)) * Cylinder(FILLET_13_RADIUS, FILLET_13_LENGTH, mode=Mode.PRIVATE)  # its axis R under the face
    add(fillet_13_slab - fillet_13_round, mode=Mode.SUBTRACT)

    # Скругление14: full round fillet: the end face becomes a half cylinder, R = half its width
    fillet_14_face = Plane((16, -1.75, 6.5), x_dir=(0, 0, 1), z_dir=(0, -1, 0))  # on the end face: x along it, z out of the body
    fillet_14_slab = fillet_14_face.offset(-FILLET_14_RADIUS / 2) * Box(FILLET_14_LENGTH, 2 * FILLET_14_RADIUS, FILLET_14_RADIUS, mode=Mode.PRIVATE)  # the body's end, R deep
    fillet_14_round = Plane((16, -1.25, 6.5), x_dir=(0, -1, 0), z_dir=(0, 0, 1)) * Cylinder(FILLET_14_RADIUS, FILLET_14_LENGTH, mode=Mode.PRIVATE)  # its axis R under the face
    add(fillet_14_slab - fillet_14_round, mode=Mode.SUBTRACT)

    # Скругление15: full round fillet: the end face becomes a half cylinder, R = half its width
    fillet_15_face = Plane((16, 3.75, 6.5), x_dir=(0, 0, 1), z_dir=(0, 1, 0))  # on the end face: x along it, z out of the body
    fillet_15_slab = fillet_15_face.offset(-FILLET_15_RADIUS / 2) * Box(FILLET_15_LENGTH, 2 * FILLET_15_RADIUS, FILLET_15_RADIUS, mode=Mode.PRIVATE)  # the body's end, R deep
    fillet_15_round = Plane((16, 3.25, 6.5), x_dir=(0, 1, 0), z_dir=(0, 0, 1)) * Cylinder(FILLET_15_RADIUS, FILLET_15_LENGTH, mode=Mode.PRIVATE)  # its axis R under the face
    add(fillet_15_slab - fillet_15_round, mode=Mode.SUBTRACT)

    # Скругление16: full round fillet: the end face becomes a half cylinder, R = half its width
    fillet_16_face = Plane((18, 3.75, 6.5), x_dir=(0, 0, 1), z_dir=(0, 1, 0))  # on the end face: x along it, z out of the body
    fillet_16_slab = fillet_16_face.offset(-FILLET_16_RADIUS / 2) * Box(FILLET_16_LENGTH, 2 * FILLET_16_RADIUS, FILLET_16_RADIUS, mode=Mode.PRIVATE)  # the body's end, R deep
    fillet_16_round = Plane((18, 3.25, 6.5), x_dir=(0, 1, 0), z_dir=(0, 0, 1)) * Cylinder(FILLET_16_RADIUS, FILLET_16_LENGTH, mode=Mode.PRIVATE)  # its axis R under the face
    add(fillet_16_slab - fillet_16_round, mode=Mode.SUBTRACT)

    # Скругление17: full round fillet: the end face becomes a half cylinder, R = half its width
    fillet_17_face = Plane((20, 3.75, 6.5), x_dir=(0, 0, -1), z_dir=(0, 1, 0))  # on the end face: x along it, z out of the body
    fillet_17_slab = fillet_17_face.offset(-FILLET_17_RADIUS / 2) * Box(FILLET_17_LENGTH, 2 * FILLET_17_RADIUS, FILLET_17_RADIUS, mode=Mode.PRIVATE)  # the body's end, R deep
    fillet_17_round = Plane((20, 3.25, 6.5), x_dir=(0, 1, 0), z_dir=(0, 0, -1)) * Cylinder(FILLET_17_RADIUS, FILLET_17_LENGTH, mode=Mode.PRIVATE)  # its axis R under the face
    add(fillet_17_slab - fillet_17_round, mode=Mode.SUBTRACT)

    # Скругление18: full round fillet: the end face becomes a half cylinder, R = half its width
    fillet_18_face = Plane((22, 3.75, 6.5), x_dir=(0, 0, 1), z_dir=(0, 1, 0))  # on the end face: x along it, z out of the body
    fillet_18_slab = fillet_18_face.offset(-FILLET_18_RADIUS / 2) * Box(FILLET_18_LENGTH, 2 * FILLET_18_RADIUS, FILLET_18_RADIUS, mode=Mode.PRIVATE)  # the body's end, R deep
    fillet_18_round = Plane((22, 3.25, 6.5), x_dir=(0, 1, 0), z_dir=(0, 0, 1)) * Cylinder(FILLET_18_RADIUS, FILLET_18_LENGTH, mode=Mode.PRIVATE)  # its axis R under the face
    add(fillet_18_slab - fillet_18_round, mode=Mode.SUBTRACT)

    # Эскиз8 → Вырез-Вытянуть3 (cut, through all)
    with BuildSketch(Plane.XY.offset(10)):
        with BuildLine():
            Line((-18, 1), (-16.5, 1))
            Line((-16.5, 1), (-15, 1))
            ThreePointArc((-15, 1), (-16.5, 2.5), (-18, 1))
        make_face()
        with BuildLine():
            Line((-15, 1), (-16.5, 1))
            Line((-16.5, 1), (-18, 1))
            ThreePointArc((-18, 1), (-16.5, -0.5), (-15, 1))
        make_face()
        with Locations((16.5, 1)):
            Circle(SKETCH_8_R)
    extrude(amount=-CUT_EXTRUDE_3_DEPTH, mode=Mode.SUBTRACT)


solid = part.part
